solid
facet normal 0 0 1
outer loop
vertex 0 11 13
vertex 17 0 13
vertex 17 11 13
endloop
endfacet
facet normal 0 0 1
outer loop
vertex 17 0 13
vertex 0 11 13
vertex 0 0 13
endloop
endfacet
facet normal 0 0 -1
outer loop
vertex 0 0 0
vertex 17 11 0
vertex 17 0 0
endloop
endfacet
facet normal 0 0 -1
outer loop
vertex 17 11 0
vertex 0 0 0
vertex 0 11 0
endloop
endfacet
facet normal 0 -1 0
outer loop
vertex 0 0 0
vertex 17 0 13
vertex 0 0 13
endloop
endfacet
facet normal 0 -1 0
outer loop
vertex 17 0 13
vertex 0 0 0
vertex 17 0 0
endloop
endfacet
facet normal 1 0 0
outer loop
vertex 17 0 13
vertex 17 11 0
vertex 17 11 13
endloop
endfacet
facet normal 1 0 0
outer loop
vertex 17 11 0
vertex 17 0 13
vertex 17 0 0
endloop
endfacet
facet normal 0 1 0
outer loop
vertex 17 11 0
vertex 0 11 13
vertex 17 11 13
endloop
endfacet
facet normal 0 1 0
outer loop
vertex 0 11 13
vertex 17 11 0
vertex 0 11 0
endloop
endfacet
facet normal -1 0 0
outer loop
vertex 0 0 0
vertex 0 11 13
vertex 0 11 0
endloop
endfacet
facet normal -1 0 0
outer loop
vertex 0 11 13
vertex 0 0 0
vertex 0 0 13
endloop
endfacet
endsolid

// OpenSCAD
// Generated by SolidPython 1.0.1 on 2020-07-29 00:46:56


cube(size = [17, 11, 13]);
/***********************************************
*********      SolidPython code:      **********
************************************************
 
# import packages: SolidPython
from solid import *
from solid.utils import *
from itertools import chain, combinations, permutations


class Resize:

    def __init__(self, scad_file):
        self.scad_file = scad_file
        #self.scad_file = import_scad(scad_file)
        # cone/cylinder param:
        self.r1 = 0
        self.r2 = 0
        self.h = 0
        # rectangular prism param:
        self.w = 0
        self.l = 0
        # ellipse param:
        self.r = 0

    # import OpenScad code (file name corresponds to shape)


    # classify shape + parameters
    def assign(self, param1, param2, param3):
        if self.scad_file == 'cone.scad':
            self.r1 = param1
            self.r2 = param2
            self.h = param3
        elif self.scad_file == 'cylinder.scad':
            self.r1 = param1
            self.r2 = param2
            self.h = param3
        elif self.scad_file == 'rectangularPrism.scad':
            self.h = param1
            self.l = param2
            self.w = param3
        else:
            self.r = param1
            self.h = param2

    # resize parameters
    def iterate(self):
        x = range(3, 20, 2)
        i = 1
        if self.scad_file == 'cone.scad':
            tempList = list(permutations(x, 2))
            for temp in tempList:
                param1 = temp[0]
                param2 = temp[1]
                filepath = 'produced_scad_files/' + 'cone' + str(param1) + '_' + str(param2) + '_' + '.scad'
                scad_render_to_file(cylinder(h=param1, r1=param2, r2=0), filepath)

        elif self.scad_file == 'cylinder.scad':
            tempList = list(permutations(x, 3))
            for temp in tempList:
                param1 = temp[0]
                param2 = temp[1]
                filepath = 'produced_scad_files/' + 'cylinder' + str(param1) + '_' + str(param2) + '_' + '.scad'
                scad_render_to_file(cylinder(h=param1, r1=param2, r2=param2), filepath)

        elif self.scad_file == 'rectangularPrism.scad':
            tempList = list(permutations(x, 3))
            for temp in tempList:
                param1 = temp[0]
                param2 = temp[1]
                param3 = temp[2]
                filepath = 'produced_scad_files/' + 'rectangularPrism' + str(param1) + '_' + str(param2) + '_' + str(
                    param3) + '.scad'
                scad_render_to_file(cube(size=(param1, param2, param3)), filepath)

        elif self.scad_file == 'ellipse.scad':
            tempList = list(permutations(x, 4))
            for temp in tempList:
                param1 = temp[0]
                param2 = temp[1]
                param3 = temp[2]
                param4 = temp[3]
                filepath = 'produced_scad_files/' + 'ellipse' + str(param1) + '_' + str(param2) + '_' + str(param3) + '_' + str(param4) + '.scad'
                scad_render_to_file(scale([param1, param2, param3])(sphere(r=param4)), filepath)

    def render_to_scadfile(self):
        scad_render_to_file(scad, 'example.scad') 
 
************************************************/
